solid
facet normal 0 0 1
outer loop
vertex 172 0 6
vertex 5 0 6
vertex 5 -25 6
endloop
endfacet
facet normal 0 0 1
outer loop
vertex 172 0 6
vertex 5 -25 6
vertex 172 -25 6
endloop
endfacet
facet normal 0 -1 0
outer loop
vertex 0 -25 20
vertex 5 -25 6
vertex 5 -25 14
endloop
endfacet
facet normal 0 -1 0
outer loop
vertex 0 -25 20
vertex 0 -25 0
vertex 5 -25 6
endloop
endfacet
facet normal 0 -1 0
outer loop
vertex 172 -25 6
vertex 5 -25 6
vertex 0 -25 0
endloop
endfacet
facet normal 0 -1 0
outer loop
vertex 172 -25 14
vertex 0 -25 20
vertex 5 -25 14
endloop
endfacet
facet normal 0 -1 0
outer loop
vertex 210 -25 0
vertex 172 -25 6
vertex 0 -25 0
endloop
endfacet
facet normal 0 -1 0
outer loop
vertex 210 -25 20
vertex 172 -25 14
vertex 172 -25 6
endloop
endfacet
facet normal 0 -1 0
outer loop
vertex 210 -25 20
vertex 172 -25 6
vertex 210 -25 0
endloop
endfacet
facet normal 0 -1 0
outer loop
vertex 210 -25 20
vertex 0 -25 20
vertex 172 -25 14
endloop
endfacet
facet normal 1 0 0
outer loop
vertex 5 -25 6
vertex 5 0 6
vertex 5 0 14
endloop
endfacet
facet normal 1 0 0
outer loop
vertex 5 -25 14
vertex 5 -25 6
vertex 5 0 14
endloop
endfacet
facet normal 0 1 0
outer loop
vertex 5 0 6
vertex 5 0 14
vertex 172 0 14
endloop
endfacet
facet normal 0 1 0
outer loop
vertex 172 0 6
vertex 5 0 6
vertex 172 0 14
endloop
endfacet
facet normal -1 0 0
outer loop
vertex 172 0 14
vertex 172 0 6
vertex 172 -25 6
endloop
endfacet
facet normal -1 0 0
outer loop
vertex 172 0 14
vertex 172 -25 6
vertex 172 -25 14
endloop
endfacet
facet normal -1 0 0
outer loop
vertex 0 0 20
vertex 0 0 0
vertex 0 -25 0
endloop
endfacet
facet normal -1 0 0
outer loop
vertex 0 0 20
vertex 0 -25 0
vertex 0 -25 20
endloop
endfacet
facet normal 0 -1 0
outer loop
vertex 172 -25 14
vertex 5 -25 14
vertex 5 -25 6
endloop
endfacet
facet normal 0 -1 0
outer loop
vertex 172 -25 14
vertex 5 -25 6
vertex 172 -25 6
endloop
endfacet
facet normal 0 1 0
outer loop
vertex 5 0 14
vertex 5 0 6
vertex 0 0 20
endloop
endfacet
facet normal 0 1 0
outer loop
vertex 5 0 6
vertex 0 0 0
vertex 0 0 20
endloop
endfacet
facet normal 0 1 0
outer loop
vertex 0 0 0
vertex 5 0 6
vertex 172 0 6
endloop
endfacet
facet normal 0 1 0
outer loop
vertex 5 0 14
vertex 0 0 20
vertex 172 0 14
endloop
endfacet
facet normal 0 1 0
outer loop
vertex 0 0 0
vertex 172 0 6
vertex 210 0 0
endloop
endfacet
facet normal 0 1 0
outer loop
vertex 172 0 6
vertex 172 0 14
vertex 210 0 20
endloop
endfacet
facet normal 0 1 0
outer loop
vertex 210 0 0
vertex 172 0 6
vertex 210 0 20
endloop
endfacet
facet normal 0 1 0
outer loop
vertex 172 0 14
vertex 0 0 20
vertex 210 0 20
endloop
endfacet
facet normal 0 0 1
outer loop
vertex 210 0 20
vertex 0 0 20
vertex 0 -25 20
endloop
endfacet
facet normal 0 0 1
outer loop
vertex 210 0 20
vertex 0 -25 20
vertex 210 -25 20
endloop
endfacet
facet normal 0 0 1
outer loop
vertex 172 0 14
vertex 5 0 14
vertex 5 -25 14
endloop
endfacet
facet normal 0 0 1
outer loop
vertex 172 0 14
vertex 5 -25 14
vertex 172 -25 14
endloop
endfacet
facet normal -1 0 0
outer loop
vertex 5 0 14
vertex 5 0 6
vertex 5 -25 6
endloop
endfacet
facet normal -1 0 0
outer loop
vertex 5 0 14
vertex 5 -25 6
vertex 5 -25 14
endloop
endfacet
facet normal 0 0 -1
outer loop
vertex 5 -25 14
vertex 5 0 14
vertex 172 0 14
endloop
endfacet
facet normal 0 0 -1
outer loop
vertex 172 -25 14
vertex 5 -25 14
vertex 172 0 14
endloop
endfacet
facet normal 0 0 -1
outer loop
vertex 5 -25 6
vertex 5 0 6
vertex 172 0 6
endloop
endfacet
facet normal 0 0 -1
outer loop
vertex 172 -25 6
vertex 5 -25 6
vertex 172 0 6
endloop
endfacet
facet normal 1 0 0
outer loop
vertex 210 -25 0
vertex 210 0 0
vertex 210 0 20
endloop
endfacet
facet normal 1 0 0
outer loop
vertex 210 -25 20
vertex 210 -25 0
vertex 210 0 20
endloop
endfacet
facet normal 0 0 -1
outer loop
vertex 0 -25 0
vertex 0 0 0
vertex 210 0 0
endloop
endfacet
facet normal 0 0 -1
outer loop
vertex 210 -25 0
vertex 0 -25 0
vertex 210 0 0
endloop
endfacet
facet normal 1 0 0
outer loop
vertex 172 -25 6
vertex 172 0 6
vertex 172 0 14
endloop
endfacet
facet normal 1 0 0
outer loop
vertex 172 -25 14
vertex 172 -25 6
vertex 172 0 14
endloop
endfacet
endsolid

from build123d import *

# Parameters (mm, degrees)
F0_W     = 167
F0_H     = 8
F1_DEPTH = 25
F0_W_2   = 210
F0_H_2   = 20
F2_DEPTH = 25


with BuildPart() as f1:
    # F0 (on Front) → F1 (new body)
    with BuildSketch(Plane.XZ):
        with Locations((88.5, 10)):
            Rectangle(F0_W, F0_H)
    extrude(amount=F1_DEPTH)


with BuildPart() as f2:
    # F0 (on Front) → F2 (new body)
    with BuildSketch(Plane.XZ):
        with Locations((105, 10)):
            Rectangle(F0_W_2, F0_H_2)
        with Locations((88.5, 10)):
            Rectangle(F0_W, F0_H, mode=Mode.SUBTRACT)
    extrude(amount=F2_DEPTH)


solid = Compound([f1.part, f2.part])
